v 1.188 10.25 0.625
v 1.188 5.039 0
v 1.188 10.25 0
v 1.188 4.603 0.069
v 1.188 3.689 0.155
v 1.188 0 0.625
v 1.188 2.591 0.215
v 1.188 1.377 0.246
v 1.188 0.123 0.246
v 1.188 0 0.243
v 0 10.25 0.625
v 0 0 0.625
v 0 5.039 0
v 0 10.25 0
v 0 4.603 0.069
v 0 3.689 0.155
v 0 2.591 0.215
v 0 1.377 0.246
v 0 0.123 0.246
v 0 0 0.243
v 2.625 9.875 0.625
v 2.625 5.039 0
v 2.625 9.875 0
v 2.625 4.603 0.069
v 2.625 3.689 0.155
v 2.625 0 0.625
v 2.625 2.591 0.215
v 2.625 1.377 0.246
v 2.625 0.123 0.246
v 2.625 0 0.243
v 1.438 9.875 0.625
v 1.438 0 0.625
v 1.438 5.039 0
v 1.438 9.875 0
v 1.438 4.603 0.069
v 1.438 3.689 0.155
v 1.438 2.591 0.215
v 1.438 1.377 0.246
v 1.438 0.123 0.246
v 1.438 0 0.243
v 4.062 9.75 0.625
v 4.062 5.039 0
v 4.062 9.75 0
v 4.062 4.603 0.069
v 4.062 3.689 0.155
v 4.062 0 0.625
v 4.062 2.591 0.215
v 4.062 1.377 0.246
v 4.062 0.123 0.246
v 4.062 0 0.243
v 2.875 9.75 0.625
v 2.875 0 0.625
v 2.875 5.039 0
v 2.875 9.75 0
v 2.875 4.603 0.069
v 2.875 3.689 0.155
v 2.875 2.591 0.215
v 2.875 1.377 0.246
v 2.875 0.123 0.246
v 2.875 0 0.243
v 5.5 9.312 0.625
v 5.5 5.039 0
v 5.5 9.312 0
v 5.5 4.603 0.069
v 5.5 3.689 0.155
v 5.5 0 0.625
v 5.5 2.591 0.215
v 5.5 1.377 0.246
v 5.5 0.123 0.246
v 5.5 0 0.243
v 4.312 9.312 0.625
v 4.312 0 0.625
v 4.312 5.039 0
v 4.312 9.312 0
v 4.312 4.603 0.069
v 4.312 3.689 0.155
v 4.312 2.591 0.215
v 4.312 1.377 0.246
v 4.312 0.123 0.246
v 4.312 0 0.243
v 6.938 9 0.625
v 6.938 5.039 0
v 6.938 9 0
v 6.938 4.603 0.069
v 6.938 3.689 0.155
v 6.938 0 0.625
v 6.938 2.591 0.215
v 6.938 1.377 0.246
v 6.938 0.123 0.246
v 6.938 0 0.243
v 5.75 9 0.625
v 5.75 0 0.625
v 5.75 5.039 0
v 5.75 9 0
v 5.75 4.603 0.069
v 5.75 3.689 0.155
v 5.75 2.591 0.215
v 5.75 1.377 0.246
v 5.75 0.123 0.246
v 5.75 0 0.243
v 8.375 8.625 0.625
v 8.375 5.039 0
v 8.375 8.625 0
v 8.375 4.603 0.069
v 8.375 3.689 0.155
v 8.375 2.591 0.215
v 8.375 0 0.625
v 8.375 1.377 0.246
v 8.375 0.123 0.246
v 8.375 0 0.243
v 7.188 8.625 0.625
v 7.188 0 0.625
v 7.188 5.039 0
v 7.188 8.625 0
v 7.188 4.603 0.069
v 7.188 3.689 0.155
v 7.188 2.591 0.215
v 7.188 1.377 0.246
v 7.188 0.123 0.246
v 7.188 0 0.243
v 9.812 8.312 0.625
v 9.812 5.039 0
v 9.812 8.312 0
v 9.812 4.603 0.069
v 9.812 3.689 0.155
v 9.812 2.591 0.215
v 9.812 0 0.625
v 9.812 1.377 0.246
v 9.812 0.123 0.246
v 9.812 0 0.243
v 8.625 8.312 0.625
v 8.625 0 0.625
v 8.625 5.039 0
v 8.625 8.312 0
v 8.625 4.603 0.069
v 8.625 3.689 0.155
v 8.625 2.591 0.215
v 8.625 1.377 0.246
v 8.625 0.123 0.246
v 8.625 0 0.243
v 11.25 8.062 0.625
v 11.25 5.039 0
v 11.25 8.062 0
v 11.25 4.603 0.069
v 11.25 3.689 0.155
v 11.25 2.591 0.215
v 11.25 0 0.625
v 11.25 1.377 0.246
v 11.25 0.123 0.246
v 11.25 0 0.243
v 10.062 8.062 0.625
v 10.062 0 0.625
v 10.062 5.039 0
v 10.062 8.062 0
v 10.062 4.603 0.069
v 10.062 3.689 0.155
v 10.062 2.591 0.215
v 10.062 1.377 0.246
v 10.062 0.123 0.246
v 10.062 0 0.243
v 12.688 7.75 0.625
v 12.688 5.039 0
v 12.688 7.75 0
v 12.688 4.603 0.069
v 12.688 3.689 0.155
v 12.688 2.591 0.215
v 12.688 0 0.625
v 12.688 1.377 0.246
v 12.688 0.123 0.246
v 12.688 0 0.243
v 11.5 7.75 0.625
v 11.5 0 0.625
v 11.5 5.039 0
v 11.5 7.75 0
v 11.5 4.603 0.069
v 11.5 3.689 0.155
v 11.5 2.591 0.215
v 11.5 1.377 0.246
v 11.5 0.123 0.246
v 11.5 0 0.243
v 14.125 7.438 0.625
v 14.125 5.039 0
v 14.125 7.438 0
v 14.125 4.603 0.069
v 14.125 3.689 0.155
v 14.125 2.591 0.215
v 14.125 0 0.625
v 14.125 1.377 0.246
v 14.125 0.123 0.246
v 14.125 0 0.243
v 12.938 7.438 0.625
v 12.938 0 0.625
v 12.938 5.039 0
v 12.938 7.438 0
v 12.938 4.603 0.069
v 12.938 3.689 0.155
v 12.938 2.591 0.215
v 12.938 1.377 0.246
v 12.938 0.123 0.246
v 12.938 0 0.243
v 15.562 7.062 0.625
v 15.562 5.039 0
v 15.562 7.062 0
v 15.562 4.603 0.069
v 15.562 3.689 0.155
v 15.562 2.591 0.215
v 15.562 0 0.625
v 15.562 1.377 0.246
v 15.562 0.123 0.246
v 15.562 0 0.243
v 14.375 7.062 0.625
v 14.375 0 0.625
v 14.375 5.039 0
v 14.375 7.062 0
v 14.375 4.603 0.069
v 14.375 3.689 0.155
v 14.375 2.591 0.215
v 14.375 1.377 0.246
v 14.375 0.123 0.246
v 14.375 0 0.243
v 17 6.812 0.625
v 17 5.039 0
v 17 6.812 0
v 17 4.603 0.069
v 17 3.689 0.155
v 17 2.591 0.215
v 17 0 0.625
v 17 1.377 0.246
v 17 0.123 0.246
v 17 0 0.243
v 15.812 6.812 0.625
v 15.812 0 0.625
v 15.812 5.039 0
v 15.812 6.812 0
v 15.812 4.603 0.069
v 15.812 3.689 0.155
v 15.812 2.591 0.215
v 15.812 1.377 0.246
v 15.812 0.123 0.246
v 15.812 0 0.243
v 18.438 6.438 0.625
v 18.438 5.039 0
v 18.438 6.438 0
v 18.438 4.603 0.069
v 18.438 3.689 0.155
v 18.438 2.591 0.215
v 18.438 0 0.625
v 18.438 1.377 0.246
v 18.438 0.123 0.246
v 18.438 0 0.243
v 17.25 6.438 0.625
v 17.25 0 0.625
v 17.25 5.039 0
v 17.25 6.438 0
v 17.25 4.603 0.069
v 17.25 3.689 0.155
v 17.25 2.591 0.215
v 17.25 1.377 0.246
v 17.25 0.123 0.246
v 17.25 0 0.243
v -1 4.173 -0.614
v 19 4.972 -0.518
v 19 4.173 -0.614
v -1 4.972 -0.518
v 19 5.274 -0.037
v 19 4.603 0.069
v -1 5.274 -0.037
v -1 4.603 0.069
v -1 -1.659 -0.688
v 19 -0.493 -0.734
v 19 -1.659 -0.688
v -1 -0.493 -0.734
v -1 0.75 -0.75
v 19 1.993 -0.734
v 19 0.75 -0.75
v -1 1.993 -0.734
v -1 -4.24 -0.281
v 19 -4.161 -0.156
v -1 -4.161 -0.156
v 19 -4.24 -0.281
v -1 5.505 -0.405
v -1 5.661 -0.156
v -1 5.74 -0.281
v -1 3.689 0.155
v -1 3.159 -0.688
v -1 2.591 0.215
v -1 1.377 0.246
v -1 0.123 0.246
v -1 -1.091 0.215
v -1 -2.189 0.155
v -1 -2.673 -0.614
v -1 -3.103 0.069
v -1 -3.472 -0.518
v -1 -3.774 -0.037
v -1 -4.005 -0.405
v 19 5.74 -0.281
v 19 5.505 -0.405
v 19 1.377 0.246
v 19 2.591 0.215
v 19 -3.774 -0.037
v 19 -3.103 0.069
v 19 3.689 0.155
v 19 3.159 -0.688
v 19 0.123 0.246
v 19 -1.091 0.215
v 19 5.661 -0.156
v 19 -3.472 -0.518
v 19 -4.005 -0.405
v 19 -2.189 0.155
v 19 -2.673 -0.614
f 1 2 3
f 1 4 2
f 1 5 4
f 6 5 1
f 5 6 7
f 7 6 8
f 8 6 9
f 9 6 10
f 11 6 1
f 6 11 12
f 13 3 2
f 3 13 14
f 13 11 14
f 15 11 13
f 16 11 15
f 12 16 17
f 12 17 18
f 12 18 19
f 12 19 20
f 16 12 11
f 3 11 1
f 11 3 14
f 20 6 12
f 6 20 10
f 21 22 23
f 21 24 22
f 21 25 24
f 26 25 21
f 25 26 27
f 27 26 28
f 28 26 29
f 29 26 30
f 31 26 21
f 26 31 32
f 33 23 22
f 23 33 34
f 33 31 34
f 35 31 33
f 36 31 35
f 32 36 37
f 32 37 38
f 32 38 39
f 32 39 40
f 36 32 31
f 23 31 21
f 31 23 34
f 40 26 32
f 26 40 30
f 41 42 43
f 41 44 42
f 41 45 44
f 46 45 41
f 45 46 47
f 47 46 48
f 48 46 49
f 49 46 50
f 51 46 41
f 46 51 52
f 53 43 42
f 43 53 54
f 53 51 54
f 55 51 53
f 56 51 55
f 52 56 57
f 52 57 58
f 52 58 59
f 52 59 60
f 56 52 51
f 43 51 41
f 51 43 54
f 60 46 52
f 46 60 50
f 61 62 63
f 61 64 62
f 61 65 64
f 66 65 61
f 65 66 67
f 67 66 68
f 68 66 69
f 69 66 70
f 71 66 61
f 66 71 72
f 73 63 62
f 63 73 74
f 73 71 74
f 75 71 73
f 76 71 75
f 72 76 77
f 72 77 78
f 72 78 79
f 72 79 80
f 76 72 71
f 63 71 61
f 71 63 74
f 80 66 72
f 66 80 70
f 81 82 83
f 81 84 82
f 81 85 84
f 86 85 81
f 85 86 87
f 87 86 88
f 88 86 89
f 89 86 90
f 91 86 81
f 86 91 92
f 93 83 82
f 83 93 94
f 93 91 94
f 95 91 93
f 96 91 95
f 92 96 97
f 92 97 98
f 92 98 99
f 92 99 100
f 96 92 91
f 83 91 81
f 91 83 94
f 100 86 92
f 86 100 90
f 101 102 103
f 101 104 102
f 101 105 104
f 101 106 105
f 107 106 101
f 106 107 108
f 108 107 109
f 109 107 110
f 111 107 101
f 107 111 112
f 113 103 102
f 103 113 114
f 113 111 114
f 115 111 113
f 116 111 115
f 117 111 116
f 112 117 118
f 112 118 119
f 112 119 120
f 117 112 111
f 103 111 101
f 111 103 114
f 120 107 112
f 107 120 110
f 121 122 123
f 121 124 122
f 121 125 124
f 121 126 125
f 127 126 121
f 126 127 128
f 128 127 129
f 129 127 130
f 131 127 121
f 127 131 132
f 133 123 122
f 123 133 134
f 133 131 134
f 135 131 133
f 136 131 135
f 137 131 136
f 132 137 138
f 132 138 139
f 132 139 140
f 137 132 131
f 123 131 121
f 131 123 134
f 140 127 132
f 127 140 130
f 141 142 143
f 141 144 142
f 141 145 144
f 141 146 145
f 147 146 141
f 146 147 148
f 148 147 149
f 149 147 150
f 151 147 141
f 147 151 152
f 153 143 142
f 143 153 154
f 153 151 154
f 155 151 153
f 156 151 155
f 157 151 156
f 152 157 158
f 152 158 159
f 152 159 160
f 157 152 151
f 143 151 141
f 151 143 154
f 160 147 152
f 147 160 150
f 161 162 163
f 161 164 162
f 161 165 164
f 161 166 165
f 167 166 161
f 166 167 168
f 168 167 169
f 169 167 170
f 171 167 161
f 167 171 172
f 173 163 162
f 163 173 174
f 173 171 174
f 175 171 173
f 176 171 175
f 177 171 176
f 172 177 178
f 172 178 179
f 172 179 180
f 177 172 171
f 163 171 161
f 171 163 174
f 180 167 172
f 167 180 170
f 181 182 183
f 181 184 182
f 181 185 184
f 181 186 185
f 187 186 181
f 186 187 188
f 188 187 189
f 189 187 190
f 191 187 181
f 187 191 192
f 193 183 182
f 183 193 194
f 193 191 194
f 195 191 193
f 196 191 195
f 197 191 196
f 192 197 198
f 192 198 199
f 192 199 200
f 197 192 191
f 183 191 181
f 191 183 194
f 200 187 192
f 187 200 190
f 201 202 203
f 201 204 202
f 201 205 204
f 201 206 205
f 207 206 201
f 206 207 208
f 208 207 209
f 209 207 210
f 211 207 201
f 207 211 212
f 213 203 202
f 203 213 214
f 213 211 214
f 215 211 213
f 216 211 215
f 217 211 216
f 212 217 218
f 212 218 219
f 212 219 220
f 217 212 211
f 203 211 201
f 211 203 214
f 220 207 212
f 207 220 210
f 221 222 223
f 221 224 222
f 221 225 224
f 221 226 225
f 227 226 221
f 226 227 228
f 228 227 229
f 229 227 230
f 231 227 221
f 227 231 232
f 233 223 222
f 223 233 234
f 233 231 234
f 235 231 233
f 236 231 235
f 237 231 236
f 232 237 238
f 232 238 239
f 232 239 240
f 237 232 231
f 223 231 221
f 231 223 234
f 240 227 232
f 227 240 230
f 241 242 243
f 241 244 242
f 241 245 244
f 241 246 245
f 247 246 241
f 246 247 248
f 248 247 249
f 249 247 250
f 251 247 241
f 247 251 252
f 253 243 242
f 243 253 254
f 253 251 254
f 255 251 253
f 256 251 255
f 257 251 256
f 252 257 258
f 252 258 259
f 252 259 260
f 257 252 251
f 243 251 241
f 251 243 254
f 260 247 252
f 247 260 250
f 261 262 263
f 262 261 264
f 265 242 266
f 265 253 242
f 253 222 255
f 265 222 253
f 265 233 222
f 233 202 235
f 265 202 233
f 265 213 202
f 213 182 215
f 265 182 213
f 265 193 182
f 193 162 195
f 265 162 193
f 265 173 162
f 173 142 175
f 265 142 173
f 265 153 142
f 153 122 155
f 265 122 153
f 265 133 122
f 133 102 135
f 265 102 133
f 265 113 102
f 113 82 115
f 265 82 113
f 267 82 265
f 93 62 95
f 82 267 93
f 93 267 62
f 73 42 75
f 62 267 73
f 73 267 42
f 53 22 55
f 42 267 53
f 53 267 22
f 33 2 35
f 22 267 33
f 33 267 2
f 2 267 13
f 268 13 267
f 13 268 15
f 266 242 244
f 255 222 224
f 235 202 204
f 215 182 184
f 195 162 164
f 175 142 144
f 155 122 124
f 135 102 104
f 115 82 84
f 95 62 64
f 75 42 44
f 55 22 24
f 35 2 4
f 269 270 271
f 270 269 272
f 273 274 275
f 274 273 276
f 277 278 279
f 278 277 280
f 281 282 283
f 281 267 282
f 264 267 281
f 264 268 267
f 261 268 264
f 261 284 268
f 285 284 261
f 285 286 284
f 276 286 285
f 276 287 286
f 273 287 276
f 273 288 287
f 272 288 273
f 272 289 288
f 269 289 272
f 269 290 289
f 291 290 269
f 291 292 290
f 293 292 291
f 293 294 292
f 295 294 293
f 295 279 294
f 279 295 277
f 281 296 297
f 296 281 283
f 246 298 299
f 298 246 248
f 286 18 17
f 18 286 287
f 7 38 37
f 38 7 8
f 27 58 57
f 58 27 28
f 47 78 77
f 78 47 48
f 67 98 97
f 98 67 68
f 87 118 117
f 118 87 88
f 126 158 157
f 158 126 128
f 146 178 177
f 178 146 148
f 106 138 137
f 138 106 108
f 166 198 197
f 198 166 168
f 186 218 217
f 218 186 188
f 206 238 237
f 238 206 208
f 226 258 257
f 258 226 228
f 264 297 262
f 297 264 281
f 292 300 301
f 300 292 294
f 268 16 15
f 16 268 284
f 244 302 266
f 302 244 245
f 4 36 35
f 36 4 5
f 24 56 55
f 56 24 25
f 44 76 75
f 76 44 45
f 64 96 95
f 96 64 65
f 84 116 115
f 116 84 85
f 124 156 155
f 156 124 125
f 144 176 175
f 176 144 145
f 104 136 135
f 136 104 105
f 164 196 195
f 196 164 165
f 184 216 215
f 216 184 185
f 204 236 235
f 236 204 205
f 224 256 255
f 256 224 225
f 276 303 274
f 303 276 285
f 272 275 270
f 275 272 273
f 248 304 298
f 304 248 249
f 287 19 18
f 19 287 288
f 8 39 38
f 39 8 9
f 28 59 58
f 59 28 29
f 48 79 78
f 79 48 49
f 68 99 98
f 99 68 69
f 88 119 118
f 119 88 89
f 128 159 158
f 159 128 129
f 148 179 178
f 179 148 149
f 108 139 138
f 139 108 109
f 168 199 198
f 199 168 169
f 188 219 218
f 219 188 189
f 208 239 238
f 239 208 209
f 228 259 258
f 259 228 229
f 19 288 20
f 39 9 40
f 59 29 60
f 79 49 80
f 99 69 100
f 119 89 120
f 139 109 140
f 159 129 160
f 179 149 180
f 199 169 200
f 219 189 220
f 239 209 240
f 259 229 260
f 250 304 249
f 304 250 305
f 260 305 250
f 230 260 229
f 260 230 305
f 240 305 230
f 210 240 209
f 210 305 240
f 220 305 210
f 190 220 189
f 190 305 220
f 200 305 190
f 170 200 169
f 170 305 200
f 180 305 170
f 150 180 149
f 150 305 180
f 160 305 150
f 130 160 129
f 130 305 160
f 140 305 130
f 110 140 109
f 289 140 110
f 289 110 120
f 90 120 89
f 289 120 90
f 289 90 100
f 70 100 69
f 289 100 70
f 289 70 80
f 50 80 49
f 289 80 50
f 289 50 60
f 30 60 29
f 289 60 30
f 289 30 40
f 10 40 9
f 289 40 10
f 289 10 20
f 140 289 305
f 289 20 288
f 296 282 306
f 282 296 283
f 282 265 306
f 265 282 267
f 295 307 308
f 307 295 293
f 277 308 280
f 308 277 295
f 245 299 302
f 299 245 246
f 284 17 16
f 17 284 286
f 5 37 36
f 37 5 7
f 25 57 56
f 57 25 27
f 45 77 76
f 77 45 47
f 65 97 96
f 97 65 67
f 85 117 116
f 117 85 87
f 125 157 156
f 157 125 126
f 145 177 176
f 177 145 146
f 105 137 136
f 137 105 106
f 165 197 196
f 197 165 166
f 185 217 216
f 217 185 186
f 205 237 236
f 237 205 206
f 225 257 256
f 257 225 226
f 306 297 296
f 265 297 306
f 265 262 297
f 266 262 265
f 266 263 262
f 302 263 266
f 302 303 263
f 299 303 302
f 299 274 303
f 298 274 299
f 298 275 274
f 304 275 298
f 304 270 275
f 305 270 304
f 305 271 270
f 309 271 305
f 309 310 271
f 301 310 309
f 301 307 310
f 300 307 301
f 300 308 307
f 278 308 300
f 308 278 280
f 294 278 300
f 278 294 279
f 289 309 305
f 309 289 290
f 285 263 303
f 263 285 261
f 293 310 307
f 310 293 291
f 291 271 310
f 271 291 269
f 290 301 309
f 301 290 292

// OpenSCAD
// Generated by SolidPython 1.1.1 on 2021-10-28 00:49:14
$fn = 25;


union() {
	translate(v = [0, 0, 0]) {
		cube(size = [1.1875000000, 10.2500000000, 0.6250000000]);
	}
	translate(v = [1.4375000000, 0, 0]) {
		cube(size = [1.1875000000, 9.8750000000, 0.6250000000]);
	}
	translate(v = [2.8750000000, 0, 0]) {
		cube(size = [1.1875000000, 9.7500000000, 0.6250000000]);
	}
	translate(v = [4.3125000000, 0, 0]) {
		cube(size = [1.1875000000, 9.3125000000, 0.6250000000]);
	}
	translate(v = [5.7500000000, 0, 0]) {
		cube(size = [1.1875000000, 9, 0.6250000000]);
	}
	translate(v = [7.1875000000, 0, 0]) {
		cube(size = [1.1875000000, 8.6250000000, 0.6250000000]);
	}
	translate(v = [8.6250000000, 0, 0]) {
		cube(size = [1.1875000000, 8.3125000000, 0.6250000000]);
	}
	translate(v = [10.0625000000, 0, 0]) {
		cube(size = [1.1875000000, 8.0625000000, 0.6250000000]);
	}
	translate(v = [11.5000000000, 0, 0]) {
		cube(size = [1.1875000000, 7.7500000000, 0.6250000000]);
	}
	translate(v = [12.9375000000, 0, 0]) {
		cube(size = [1.1875000000, 7.4375000000, 0.6250000000]);
	}
	translate(v = [14.3750000000, 0, 0]) {
		cube(size = [1.1875000000, 7.0625000000, 0.6250000000]);
	}
	translate(v = [15.8125000000, 0, 0]) {
		cube(size = [1.1875000000, 6.8125000000, 0.6250000000]);
	}
	translate(v = [17.2500000000, 0, 0]) {
		cube(size = [1.1875000000, 6.4375000000, 0.6250000000]);
	}
	color(alpha = 1.0000000000, c = [1, 0, 0]) {
		translate(v = [-1, 0.7500000000, -0.2500000000]) {
			rotate(a = [0, 90, 0]) {
				scale(v = [0.5000000000, 5, 20]) {
					cylinder();
				}
			}
		}
	}
}
/***********************************************
*********      SolidPython code:      **********
************************************************
 
# SolidPython example code 
# Brygg Ullmer, Clemson University
# Written 2021-10-28

from       solid import * # load in SolidPython/SCAD support code
from synthShapes import *
import yaml

yfn = 'xylophone.yaml'
yf  = open(yfn, 'r')
yd  = yaml.safe_load(yf)

barWidth   = convertFractional(yd['allBars']['wide'])
barThick   = convertFractional(yd['allBars']['thick'])
between    = convertFractional(yd['allBars']['between'])
barLengths = convertFractionalList(yd['lengths'])

#print(barWidth, barThick, barLengths)

outGeom = None; offset = 0
for barLength in barLengths:
  c1 = cube([barWidth, barLength, barThick])
  c2 = translate([offset,0,0])(c1)

  if outGeom == None: outGeom = c2
  else:               outGeom += c2
  offset += barWidth + between

y1 = cylinder()
y2 = scale([.5,5,20])(y1)
y3 = rotate([0,90,0])(y2)
y4 = translate([-1,.75,-.25])(y3)
y5 = color([1,0,0])(y4)
outGeom += y5

radialSegments = 25; hdr = '$fn = %s;' % radialSegments # create a header for the export
scad_render_to_file(outGeom, 'exXyl02.scad', file_header=hdr) # write the .scad file

### end ###

 
 
************************************************/
